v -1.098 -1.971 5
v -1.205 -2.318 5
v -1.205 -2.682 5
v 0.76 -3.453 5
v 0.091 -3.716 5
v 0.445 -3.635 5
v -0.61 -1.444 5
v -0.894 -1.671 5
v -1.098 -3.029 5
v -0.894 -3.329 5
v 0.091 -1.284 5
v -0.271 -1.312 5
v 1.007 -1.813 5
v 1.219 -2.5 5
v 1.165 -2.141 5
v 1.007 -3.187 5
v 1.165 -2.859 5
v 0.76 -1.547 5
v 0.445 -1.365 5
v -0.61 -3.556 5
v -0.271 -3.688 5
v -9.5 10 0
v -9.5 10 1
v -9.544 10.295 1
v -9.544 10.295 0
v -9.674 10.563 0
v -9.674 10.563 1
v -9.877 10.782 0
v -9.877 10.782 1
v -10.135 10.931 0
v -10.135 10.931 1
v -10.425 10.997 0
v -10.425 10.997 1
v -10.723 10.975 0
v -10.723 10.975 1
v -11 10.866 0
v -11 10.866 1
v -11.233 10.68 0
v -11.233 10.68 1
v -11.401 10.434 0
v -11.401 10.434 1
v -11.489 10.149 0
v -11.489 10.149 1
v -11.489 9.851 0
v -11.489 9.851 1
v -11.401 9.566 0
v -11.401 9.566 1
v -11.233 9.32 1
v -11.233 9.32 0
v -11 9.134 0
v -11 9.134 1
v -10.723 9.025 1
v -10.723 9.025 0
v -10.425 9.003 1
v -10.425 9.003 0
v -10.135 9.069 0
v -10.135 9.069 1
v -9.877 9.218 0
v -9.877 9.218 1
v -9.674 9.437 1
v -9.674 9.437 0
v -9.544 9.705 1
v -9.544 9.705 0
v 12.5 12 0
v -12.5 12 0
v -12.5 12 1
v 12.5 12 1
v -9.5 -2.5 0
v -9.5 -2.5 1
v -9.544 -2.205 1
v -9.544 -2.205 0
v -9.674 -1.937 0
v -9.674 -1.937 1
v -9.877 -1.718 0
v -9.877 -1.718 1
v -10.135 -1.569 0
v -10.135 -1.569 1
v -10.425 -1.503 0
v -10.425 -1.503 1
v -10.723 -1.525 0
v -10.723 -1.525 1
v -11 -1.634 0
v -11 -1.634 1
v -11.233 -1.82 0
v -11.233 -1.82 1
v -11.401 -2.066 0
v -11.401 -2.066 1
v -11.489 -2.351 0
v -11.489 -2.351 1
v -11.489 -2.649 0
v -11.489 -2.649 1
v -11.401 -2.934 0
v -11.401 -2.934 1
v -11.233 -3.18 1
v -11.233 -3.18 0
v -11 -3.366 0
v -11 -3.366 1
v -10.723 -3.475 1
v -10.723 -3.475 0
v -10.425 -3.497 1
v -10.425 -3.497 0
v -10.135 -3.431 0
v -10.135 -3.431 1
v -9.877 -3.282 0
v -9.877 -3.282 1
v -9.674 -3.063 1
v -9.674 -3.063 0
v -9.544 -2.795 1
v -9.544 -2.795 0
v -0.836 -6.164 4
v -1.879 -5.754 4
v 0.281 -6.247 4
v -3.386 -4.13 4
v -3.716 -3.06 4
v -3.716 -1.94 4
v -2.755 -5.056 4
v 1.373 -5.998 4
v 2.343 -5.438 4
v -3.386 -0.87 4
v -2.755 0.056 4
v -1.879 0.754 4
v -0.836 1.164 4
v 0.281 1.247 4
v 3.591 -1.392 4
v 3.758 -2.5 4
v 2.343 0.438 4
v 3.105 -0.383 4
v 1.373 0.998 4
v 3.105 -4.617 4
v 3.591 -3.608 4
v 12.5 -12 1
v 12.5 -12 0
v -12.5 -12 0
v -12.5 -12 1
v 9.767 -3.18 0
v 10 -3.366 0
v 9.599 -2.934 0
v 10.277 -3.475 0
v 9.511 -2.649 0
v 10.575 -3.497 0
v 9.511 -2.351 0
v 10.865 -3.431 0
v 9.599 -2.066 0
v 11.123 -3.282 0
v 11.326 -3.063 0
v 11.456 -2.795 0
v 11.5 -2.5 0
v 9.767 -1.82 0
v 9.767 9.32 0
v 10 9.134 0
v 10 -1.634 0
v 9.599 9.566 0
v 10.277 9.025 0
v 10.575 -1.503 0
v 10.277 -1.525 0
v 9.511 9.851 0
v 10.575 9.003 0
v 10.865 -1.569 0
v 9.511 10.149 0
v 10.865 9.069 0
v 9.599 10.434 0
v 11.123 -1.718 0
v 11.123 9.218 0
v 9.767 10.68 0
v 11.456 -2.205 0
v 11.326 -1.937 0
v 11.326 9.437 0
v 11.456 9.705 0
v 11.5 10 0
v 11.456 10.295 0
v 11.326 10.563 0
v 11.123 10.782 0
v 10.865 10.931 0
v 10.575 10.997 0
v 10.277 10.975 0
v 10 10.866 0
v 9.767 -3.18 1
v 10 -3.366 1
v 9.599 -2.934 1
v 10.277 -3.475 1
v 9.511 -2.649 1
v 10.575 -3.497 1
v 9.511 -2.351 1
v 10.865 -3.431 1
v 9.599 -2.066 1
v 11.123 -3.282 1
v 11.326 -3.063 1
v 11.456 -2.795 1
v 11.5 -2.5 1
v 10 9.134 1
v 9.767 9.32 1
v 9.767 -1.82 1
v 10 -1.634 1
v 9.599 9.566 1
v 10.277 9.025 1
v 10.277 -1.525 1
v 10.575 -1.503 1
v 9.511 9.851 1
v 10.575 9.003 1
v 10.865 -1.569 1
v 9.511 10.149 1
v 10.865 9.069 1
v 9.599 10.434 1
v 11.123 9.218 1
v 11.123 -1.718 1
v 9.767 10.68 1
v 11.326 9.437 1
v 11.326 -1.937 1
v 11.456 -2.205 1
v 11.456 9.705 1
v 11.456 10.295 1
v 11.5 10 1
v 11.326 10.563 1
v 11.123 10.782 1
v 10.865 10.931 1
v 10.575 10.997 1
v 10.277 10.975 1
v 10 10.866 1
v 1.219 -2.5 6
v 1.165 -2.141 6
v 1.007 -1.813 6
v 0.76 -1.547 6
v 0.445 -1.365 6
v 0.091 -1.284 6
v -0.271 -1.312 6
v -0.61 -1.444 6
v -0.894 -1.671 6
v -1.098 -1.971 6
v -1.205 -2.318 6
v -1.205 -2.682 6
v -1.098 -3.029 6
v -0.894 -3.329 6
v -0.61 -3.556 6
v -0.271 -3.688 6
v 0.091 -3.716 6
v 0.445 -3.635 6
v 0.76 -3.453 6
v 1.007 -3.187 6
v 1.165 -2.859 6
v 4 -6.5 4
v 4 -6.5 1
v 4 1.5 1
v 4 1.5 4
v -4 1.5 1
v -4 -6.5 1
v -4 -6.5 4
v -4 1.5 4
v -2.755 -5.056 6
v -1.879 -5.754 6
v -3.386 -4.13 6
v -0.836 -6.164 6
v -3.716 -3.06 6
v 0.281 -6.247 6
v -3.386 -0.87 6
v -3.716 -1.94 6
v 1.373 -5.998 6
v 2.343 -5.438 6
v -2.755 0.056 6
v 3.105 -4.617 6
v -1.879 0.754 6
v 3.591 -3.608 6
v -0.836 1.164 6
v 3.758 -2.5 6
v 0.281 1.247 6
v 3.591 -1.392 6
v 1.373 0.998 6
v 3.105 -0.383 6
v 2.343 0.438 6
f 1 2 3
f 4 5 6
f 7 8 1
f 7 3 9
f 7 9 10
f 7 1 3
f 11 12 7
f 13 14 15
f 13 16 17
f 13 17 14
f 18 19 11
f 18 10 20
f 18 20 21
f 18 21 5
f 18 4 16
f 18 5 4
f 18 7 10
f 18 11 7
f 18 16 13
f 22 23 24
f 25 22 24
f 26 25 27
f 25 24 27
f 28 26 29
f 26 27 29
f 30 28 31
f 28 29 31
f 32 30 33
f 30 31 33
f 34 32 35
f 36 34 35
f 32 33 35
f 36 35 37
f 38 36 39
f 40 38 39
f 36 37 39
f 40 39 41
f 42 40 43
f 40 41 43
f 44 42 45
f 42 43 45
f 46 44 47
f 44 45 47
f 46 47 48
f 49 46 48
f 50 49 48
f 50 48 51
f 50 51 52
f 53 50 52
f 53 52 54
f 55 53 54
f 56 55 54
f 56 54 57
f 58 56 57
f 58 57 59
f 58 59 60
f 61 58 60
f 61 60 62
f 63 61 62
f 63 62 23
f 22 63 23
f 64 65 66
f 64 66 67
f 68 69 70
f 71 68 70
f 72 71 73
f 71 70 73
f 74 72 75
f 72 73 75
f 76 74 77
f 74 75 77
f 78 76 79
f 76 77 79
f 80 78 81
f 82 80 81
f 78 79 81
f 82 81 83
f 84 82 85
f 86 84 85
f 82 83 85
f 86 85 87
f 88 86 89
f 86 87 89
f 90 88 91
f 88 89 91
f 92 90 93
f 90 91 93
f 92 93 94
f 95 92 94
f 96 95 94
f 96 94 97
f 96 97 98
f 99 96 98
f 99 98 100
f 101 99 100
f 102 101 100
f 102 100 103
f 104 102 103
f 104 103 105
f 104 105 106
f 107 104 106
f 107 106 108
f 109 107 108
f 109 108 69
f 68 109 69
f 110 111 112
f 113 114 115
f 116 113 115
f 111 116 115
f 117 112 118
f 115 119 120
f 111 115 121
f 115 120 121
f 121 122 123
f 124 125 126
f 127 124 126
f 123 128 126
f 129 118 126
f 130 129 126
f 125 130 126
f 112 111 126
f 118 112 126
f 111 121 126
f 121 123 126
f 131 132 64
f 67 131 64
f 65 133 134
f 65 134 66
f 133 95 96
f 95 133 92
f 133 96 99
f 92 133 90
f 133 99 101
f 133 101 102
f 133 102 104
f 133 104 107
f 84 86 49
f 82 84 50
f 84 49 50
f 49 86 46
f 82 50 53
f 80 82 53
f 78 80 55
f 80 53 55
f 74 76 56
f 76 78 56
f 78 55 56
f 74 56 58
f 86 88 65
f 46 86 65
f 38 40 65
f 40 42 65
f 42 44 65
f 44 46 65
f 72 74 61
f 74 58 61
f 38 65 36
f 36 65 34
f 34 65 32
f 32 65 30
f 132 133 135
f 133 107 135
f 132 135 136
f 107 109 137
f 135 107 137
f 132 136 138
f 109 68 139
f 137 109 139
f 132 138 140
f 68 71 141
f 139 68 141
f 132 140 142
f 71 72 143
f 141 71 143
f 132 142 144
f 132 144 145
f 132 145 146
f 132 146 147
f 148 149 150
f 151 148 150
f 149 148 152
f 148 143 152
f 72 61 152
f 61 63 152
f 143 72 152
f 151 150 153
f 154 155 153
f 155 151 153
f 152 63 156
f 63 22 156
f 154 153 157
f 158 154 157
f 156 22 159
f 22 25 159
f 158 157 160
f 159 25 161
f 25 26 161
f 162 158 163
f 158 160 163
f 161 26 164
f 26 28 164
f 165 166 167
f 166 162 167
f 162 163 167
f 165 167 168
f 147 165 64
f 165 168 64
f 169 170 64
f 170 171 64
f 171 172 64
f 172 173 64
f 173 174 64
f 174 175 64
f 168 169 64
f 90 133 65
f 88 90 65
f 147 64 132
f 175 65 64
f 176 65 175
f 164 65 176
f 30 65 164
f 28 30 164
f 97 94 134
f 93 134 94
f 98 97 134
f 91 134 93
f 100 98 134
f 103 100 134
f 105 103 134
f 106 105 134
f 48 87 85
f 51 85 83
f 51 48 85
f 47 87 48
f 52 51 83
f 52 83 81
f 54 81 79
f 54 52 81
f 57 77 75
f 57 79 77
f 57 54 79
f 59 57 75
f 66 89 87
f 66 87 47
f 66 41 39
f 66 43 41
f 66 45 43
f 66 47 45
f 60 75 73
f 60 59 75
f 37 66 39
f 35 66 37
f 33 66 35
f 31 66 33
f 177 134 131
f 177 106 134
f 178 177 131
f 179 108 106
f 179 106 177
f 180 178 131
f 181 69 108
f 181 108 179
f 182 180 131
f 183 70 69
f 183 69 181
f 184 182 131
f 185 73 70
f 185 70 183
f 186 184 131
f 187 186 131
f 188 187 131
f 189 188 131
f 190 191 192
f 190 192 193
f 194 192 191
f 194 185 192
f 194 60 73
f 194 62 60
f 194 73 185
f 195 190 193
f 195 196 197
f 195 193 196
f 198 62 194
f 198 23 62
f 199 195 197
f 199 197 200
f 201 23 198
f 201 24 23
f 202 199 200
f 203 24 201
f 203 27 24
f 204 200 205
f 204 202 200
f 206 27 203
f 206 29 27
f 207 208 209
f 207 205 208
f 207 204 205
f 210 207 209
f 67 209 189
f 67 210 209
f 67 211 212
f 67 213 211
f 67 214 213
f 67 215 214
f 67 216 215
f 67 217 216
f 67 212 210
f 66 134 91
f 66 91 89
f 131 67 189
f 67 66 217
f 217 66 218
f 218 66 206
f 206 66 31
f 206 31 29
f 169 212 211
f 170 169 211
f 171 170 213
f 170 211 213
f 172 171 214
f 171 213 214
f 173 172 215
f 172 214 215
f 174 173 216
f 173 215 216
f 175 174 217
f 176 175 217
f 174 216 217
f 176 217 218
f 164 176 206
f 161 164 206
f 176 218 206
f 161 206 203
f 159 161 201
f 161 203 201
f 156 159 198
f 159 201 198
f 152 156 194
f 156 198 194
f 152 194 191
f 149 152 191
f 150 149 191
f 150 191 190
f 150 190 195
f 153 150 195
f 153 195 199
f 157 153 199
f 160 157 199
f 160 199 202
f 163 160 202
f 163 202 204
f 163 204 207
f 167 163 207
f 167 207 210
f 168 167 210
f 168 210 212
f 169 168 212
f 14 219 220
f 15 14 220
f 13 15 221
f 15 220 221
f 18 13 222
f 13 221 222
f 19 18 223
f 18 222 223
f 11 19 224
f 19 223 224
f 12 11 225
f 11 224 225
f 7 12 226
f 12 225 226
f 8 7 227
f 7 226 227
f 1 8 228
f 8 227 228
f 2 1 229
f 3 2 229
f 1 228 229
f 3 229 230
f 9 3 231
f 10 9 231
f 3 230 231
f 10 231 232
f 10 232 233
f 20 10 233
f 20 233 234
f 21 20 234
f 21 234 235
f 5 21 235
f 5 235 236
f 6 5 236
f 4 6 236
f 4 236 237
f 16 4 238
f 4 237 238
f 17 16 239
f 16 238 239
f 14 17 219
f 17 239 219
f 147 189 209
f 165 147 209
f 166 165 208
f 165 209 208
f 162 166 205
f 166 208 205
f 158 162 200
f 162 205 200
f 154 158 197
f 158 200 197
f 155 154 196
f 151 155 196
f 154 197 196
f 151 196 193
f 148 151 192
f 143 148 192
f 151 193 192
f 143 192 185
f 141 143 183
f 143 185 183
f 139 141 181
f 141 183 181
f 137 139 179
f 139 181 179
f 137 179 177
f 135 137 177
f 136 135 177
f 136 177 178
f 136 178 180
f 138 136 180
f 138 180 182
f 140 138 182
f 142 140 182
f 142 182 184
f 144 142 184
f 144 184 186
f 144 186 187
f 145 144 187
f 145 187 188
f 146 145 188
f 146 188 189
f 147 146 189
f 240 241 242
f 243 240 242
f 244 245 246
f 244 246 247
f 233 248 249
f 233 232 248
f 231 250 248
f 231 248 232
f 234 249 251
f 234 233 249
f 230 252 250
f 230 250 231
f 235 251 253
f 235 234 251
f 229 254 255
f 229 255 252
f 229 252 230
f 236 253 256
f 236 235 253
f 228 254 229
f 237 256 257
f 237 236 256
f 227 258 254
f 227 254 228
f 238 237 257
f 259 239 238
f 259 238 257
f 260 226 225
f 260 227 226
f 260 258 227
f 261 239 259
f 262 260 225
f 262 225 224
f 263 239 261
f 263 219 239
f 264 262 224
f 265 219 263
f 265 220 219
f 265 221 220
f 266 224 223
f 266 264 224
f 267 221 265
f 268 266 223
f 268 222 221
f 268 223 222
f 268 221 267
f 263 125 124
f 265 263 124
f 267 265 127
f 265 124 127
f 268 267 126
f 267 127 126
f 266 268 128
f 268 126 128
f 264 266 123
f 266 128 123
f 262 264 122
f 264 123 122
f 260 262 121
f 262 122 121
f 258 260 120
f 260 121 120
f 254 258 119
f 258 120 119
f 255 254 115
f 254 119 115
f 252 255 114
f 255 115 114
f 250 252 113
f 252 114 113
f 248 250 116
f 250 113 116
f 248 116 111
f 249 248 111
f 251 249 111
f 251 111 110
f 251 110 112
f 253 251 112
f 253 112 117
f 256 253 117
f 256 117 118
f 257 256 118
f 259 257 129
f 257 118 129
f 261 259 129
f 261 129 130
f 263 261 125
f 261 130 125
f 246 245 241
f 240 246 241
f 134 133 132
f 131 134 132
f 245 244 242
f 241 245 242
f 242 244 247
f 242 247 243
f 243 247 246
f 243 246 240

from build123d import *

# Parameters (mm, degrees)
SKETCH1_W               = 25
SKETCH1_H               = 24
BOSS_EXTRUDE1_DEPTH     = 1
SKETCH2_W               = 8
SKETCH2_H               = 8
BOSS_EXTRUDE2_DEPTH     = 3
SKETCH3_R               = 3.757777991
BOSS_EXTRUDE3_DEPTH     = 2
SKETCH4_R               = 1.219033686
CUT_EXTRUDE1_DEPTH      = 1
SKETCH5_R               = 1
CUT_EXTRUDE2_DEPTH      = 6
CUT_EXTRUDE2_DEPTH_BACK = 2


with BuildPart() as part:
    # Sketch1 → Boss-Extrude1 (new body)
    with BuildSketch(Plane.XY):
        Rectangle(SKETCH1_W, SKETCH1_H)
    extrude(amount=BOSS_EXTRUDE1_DEPTH)

    # Sketch5 → Cut-Extrude2 (cut, two sides)
    with BuildSketch(Plane.XY.offset(1)) as cut_extrude2_sk:
        with Locations((-10.5, -2.5)):
            Circle(SKETCH5_R)
        with Locations((-10.5, 10)):
            Circle(SKETCH5_R)
        with Locations((10.5, 10)):
            Circle(SKETCH5_R)
        with Locations((10.5, -2.5)):
            Circle(SKETCH5_R)
    extrude(amount=CUT_EXTRUDE2_DEPTH, mode=Mode.SUBTRACT)
    extrude(cut_extrude2_sk.sketch, amount=-CUT_EXTRUDE2_DEPTH_BACK, mode=Mode.SUBTRACT)


with BuildPart() as body_2:
    # Sketch2 → Boss-Extrude2 (new body)
    with BuildSketch(Plane.XY.offset(1)):
        with Locations((0, -2.5)):
            Rectangle(SKETCH2_W, SKETCH2_H)
    extrude(amount=BOSS_EXTRUDE2_DEPTH)


with BuildPart() as body_3:
    # Sketch3 → Boss-Extrude3 (new body)
    with BuildSketch(Plane.XY.offset(4)):
        with Locations((0, -2.5)):
            Circle(SKETCH3_R)
    extrude(amount=BOSS_EXTRUDE3_DEPTH)

    # Sketch4 → Cut-Extrude1 (cut)
    with BuildSketch(Plane.XY.offset(6)):
        with Locations((0, -2.5)):
            Circle(SKETCH4_R)
    extrude(amount=-CUT_EXTRUDE1_DEPTH, mode=Mode.SUBTRACT)


solid = Compound([part.part, body_2.part, body_3.part])
